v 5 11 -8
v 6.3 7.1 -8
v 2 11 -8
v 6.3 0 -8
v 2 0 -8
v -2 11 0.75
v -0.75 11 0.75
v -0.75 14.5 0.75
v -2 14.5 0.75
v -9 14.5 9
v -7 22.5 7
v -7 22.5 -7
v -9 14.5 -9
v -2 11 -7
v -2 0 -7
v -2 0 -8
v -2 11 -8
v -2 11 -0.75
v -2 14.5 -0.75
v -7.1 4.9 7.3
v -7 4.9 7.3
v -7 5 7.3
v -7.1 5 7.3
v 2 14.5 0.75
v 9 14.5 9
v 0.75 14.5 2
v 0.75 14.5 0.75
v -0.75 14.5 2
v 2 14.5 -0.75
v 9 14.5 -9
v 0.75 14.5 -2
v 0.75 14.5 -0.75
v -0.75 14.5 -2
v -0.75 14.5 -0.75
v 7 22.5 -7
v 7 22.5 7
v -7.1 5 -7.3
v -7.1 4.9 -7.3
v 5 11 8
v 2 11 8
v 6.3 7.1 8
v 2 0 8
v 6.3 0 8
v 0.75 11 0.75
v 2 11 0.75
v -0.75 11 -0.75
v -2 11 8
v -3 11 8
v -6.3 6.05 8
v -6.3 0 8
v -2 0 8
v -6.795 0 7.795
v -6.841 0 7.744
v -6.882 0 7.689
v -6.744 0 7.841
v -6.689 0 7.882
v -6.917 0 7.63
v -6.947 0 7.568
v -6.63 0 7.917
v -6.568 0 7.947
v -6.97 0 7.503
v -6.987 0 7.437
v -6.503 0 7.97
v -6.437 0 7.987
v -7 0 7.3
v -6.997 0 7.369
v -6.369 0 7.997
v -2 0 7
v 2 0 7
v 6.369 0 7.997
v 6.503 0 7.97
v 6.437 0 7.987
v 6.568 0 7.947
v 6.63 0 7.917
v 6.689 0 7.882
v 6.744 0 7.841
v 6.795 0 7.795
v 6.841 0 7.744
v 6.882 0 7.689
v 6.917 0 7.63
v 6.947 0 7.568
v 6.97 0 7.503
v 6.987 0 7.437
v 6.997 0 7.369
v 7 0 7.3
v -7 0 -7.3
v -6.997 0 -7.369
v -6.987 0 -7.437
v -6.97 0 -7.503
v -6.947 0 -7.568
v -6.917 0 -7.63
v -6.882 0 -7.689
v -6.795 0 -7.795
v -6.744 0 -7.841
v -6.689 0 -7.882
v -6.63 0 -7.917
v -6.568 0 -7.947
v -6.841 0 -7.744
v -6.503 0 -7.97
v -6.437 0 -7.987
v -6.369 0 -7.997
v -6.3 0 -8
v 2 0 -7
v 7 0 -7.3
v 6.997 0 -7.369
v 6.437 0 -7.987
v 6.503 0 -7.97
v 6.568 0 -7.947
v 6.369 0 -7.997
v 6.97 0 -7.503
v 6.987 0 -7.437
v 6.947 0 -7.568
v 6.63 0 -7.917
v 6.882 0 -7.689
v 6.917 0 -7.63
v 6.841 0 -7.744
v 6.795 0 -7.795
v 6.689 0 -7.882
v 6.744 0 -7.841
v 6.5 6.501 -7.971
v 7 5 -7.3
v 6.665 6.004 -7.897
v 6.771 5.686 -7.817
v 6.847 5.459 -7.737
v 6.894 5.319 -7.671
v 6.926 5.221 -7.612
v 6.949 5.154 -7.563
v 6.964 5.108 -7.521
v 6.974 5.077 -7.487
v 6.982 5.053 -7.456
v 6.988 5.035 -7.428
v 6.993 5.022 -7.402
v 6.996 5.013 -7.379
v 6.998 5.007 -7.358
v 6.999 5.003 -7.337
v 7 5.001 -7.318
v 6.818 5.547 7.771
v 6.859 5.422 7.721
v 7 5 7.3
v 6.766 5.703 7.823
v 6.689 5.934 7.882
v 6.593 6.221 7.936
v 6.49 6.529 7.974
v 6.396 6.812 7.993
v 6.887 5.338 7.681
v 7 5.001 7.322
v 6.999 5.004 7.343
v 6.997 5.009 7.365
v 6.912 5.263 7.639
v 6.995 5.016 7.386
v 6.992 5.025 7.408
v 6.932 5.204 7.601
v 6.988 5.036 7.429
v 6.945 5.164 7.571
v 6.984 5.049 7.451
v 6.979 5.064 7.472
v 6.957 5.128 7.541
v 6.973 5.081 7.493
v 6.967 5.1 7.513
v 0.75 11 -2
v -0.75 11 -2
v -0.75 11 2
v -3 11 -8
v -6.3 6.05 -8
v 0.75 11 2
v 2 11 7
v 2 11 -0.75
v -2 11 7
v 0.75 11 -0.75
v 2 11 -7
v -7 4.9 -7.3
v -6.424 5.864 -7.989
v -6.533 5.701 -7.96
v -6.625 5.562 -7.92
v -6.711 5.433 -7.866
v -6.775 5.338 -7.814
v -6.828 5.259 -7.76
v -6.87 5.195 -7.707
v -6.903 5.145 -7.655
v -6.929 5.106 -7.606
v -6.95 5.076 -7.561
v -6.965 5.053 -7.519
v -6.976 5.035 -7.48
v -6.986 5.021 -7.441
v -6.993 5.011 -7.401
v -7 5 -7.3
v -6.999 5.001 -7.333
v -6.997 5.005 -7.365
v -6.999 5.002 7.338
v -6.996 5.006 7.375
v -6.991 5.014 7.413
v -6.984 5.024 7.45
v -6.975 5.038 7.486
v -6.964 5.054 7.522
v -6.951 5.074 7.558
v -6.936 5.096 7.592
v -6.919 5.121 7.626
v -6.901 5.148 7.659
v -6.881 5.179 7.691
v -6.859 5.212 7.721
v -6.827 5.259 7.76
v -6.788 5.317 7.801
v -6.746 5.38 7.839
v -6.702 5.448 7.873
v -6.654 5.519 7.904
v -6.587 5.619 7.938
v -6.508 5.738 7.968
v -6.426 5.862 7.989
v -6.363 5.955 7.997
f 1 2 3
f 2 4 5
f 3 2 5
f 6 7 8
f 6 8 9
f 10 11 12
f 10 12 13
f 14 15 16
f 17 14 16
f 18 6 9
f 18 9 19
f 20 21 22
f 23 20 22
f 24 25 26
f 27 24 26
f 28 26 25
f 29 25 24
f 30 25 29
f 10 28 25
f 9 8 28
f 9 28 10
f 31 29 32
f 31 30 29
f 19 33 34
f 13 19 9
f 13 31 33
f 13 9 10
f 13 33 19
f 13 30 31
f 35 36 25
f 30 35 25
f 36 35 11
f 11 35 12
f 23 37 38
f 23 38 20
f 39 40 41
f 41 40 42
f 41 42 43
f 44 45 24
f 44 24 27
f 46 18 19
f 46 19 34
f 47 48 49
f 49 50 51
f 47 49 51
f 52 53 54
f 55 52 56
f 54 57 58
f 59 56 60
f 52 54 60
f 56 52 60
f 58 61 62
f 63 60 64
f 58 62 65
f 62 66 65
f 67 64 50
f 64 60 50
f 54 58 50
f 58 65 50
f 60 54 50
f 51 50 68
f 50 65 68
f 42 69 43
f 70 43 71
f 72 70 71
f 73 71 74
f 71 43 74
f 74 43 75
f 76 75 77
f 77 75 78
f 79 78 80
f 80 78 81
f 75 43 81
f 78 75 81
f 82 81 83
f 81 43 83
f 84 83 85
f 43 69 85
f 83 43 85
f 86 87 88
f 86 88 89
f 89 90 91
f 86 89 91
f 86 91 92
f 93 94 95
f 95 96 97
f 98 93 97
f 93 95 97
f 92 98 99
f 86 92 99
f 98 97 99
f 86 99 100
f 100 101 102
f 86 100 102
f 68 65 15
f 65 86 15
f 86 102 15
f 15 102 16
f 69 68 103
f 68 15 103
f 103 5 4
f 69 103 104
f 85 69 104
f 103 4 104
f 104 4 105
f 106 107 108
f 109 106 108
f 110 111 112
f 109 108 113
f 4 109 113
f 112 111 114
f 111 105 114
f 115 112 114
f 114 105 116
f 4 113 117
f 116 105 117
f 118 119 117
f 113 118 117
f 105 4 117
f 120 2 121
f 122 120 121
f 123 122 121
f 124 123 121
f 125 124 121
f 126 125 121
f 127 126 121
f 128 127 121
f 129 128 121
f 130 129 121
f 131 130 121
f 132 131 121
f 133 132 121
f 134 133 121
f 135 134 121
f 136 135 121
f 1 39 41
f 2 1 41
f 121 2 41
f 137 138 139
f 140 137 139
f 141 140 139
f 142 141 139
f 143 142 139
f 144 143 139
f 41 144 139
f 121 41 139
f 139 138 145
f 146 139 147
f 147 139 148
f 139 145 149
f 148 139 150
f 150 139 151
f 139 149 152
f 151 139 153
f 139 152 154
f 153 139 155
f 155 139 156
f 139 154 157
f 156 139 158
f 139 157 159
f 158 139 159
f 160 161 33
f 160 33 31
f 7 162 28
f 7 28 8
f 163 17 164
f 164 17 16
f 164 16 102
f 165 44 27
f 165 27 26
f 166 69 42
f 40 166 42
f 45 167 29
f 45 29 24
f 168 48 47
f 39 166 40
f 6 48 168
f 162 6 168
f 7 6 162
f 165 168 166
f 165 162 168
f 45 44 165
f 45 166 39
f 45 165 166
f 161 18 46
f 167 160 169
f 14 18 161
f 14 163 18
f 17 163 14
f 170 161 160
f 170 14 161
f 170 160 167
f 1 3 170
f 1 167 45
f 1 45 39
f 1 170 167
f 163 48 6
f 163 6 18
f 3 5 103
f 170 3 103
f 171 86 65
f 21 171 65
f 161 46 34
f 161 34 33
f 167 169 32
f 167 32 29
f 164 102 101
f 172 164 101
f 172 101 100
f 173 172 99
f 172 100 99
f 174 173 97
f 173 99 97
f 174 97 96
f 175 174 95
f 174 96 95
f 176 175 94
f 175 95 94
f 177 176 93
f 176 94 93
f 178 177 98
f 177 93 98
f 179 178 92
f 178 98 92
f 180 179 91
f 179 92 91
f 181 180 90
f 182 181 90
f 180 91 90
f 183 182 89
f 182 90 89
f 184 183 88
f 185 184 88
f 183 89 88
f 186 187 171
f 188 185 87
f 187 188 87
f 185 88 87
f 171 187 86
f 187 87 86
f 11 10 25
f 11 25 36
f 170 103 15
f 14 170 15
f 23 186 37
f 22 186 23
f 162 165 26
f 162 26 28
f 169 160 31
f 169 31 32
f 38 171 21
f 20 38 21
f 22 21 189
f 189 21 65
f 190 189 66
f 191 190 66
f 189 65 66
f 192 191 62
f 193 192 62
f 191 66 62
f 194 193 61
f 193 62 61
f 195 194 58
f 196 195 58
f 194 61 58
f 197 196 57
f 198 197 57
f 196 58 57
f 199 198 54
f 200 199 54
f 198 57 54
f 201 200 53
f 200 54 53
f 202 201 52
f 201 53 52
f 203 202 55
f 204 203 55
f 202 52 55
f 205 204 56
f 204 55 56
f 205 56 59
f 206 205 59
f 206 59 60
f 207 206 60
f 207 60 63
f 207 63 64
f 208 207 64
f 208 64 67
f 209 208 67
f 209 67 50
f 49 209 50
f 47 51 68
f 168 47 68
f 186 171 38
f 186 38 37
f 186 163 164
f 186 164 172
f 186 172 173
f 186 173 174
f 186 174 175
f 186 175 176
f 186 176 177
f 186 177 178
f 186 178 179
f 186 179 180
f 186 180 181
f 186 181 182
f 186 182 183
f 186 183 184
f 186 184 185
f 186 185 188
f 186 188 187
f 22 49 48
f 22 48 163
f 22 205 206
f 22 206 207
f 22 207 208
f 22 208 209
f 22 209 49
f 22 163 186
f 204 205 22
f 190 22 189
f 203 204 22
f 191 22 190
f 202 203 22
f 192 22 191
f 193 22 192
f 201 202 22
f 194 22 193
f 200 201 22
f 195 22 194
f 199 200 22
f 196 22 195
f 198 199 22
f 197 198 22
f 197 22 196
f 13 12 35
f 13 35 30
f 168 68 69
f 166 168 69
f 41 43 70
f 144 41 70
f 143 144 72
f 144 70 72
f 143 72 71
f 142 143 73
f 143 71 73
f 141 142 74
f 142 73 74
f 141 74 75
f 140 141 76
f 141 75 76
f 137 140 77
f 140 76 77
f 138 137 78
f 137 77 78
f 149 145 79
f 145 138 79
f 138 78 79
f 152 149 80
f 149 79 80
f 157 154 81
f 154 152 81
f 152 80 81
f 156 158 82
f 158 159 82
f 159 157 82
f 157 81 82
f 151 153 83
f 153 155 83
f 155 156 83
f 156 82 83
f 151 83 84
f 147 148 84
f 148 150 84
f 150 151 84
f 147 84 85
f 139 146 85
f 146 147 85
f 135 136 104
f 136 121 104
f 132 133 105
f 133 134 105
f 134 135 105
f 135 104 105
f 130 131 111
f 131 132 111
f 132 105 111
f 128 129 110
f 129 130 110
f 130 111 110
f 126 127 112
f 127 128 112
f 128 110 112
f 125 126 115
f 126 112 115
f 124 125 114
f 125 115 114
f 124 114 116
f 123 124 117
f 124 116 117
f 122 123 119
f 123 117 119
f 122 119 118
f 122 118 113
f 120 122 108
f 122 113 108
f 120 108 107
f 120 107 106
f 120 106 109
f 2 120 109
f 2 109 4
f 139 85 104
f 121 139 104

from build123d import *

# Parameters (mm, degrees)
BOSS_EXTRUDE1_DEPTH = 11
CUT_EXTRUDE1_DEPTH  = 18
CUT_EXTRUDE2_DEPTH  = 18
BOSS_EXTRUDE2_DEPTH = 3.5
BOSS_EXTRUDE3_DEPTH = 8
CUT_EXTRUDE4_DEPTH  = 27
CUT_EXTRUDE5_DEPTH  = 27
SKETCH11_W          = 14.6
SKETCH11_H          = 0.1
BOSS_EXTRUDE4_DEPTH = 0.1


with BuildPart() as part:
    # Sketch1 → Boss-Extrude1 (new body)
    with BuildSketch(Plane(origin=(0, 0, 0), x_dir=(1, 0, 0), z_dir=(0, 1, 0))):
        with BuildLine():
            Line((-6.3, -8), (-2, -8))
            Line((-2, -8), (-2, -7))
            Line((-2, -7), (2, -7))
            Line((2, -7), (2, -8))
            Line((2, -8), (6.3, -8))
            ThreePointArc((6.3, -8), (6.794974747, -7.794974747), (7, -7.3))
            Line((7, -7.3), (7, 7.3))
            ThreePointArc((7, 7.3), (6.794974747, 7.794974747), (6.3, 8))
            Line((6.3, 8), (2, 8))
            Line((2, 8), (2, 7))
            Line((2, 7), (-2, 7))
            Line((-2, 7), (-2, 8))
            Line((-2, 8), (-6.3, 8))
            ThreePointArc((-6.3, 8), (-6.794974747, 7.794974747), (-7, 7.3))
            Line((-7, 7.3), (-7, -7.3))
            ThreePointArc((-7, -7.3), (-6.794974747, -7.794974747), (-6.3, -8))
        make_face()
    extrude(amount=BOSS_EXTRUDE1_DEPTH)

    # Sketch2 → Cut-Extrude1 (cut)
    with BuildSketch(Plane.XY.offset(8)):
        Polygon((-3, 11), (-7, 5), (-7, 11), align=None)
    extrude(amount=-CUT_EXTRUDE1_DEPTH, mode=Mode.SUBTRACT)

    # Sketch3 → Cut-Extrude2 (cut)
    with BuildSketch(Plane.XY.offset(8)):
        Polygon((5, 11), (7, 5), (7, 11), align=None)
    extrude(amount=-CUT_EXTRUDE2_DEPTH, mode=Mode.SUBTRACT)

    # Sketch4 → Boss-Extrude2 (add)
    with BuildSketch(Plane(origin=(0, 11, 0), x_dir=(1, 0, 0), z_dir=(0, 1, 0))):
        Polygon((-0.75, 0.75), (-0.75, 2), (0.75, 2), (0.75, 0.75), (2, 0.75), (2, -0.75), (0.75, -0.75), (0.75, -2), (-0.75, -2), (-0.75, -0.75), (-2, -0.75), (-2, 0.75), align=None)
    extrude(amount=BOSS_EXTRUDE2_DEPTH)

    # Sketch7 → Boss-Extrude3 (add)
    with BuildSketch(Plane(origin=(0, 14.5, 0), x_dir=(1, 0, 0), z_dir=(0, 1, 0))):
        Polygon((9, -9), (-9, -9), (-9, 9), (0, 9), (9, 9), align=None)
    extrude(amount=BOSS_EXTRUDE3_DEPTH)

    # Sketch10 → Cut-Extrude4 (cut)
    with BuildSketch(Plane.ZY.offset(9)):
        Polygon((-9, 22.5), (-7, 22.5), (-9, 14.5), align=None)
        Polygon((7, 22.5), (9, 22.5), (9, 14.5), align=None)
    extrude(amount=-CUT_EXTRUDE4_DEPTH, mode=Mode.SUBTRACT)

    # Sketch8 → Cut-Extrude5 (cut)
    with BuildSketch(Plane(origin=(0, 0, -9), x_dir=(-1, 0, 0), z_dir=(0, 0, -1))):
        Polygon((9, 22.5), (7, 22.5), (9, 14.5), align=None)
        Polygon((-9, 22.5), (-7, 22.5), (-9, 14.5), align=None)
    extrude(amount=-CUT_EXTRUDE5_DEPTH, mode=Mode.SUBTRACT)

    # Sketch11 → Boss-Extrude4 (add)
    with BuildSketch(Plane.ZY.offset(7)):
        with Locations((0, 4.95)):
            Rectangle(SKETCH11_W, SKETCH11_H)
    extrude(amount=BOSS_EXTRUDE4_DEPTH)


solid = part.part
